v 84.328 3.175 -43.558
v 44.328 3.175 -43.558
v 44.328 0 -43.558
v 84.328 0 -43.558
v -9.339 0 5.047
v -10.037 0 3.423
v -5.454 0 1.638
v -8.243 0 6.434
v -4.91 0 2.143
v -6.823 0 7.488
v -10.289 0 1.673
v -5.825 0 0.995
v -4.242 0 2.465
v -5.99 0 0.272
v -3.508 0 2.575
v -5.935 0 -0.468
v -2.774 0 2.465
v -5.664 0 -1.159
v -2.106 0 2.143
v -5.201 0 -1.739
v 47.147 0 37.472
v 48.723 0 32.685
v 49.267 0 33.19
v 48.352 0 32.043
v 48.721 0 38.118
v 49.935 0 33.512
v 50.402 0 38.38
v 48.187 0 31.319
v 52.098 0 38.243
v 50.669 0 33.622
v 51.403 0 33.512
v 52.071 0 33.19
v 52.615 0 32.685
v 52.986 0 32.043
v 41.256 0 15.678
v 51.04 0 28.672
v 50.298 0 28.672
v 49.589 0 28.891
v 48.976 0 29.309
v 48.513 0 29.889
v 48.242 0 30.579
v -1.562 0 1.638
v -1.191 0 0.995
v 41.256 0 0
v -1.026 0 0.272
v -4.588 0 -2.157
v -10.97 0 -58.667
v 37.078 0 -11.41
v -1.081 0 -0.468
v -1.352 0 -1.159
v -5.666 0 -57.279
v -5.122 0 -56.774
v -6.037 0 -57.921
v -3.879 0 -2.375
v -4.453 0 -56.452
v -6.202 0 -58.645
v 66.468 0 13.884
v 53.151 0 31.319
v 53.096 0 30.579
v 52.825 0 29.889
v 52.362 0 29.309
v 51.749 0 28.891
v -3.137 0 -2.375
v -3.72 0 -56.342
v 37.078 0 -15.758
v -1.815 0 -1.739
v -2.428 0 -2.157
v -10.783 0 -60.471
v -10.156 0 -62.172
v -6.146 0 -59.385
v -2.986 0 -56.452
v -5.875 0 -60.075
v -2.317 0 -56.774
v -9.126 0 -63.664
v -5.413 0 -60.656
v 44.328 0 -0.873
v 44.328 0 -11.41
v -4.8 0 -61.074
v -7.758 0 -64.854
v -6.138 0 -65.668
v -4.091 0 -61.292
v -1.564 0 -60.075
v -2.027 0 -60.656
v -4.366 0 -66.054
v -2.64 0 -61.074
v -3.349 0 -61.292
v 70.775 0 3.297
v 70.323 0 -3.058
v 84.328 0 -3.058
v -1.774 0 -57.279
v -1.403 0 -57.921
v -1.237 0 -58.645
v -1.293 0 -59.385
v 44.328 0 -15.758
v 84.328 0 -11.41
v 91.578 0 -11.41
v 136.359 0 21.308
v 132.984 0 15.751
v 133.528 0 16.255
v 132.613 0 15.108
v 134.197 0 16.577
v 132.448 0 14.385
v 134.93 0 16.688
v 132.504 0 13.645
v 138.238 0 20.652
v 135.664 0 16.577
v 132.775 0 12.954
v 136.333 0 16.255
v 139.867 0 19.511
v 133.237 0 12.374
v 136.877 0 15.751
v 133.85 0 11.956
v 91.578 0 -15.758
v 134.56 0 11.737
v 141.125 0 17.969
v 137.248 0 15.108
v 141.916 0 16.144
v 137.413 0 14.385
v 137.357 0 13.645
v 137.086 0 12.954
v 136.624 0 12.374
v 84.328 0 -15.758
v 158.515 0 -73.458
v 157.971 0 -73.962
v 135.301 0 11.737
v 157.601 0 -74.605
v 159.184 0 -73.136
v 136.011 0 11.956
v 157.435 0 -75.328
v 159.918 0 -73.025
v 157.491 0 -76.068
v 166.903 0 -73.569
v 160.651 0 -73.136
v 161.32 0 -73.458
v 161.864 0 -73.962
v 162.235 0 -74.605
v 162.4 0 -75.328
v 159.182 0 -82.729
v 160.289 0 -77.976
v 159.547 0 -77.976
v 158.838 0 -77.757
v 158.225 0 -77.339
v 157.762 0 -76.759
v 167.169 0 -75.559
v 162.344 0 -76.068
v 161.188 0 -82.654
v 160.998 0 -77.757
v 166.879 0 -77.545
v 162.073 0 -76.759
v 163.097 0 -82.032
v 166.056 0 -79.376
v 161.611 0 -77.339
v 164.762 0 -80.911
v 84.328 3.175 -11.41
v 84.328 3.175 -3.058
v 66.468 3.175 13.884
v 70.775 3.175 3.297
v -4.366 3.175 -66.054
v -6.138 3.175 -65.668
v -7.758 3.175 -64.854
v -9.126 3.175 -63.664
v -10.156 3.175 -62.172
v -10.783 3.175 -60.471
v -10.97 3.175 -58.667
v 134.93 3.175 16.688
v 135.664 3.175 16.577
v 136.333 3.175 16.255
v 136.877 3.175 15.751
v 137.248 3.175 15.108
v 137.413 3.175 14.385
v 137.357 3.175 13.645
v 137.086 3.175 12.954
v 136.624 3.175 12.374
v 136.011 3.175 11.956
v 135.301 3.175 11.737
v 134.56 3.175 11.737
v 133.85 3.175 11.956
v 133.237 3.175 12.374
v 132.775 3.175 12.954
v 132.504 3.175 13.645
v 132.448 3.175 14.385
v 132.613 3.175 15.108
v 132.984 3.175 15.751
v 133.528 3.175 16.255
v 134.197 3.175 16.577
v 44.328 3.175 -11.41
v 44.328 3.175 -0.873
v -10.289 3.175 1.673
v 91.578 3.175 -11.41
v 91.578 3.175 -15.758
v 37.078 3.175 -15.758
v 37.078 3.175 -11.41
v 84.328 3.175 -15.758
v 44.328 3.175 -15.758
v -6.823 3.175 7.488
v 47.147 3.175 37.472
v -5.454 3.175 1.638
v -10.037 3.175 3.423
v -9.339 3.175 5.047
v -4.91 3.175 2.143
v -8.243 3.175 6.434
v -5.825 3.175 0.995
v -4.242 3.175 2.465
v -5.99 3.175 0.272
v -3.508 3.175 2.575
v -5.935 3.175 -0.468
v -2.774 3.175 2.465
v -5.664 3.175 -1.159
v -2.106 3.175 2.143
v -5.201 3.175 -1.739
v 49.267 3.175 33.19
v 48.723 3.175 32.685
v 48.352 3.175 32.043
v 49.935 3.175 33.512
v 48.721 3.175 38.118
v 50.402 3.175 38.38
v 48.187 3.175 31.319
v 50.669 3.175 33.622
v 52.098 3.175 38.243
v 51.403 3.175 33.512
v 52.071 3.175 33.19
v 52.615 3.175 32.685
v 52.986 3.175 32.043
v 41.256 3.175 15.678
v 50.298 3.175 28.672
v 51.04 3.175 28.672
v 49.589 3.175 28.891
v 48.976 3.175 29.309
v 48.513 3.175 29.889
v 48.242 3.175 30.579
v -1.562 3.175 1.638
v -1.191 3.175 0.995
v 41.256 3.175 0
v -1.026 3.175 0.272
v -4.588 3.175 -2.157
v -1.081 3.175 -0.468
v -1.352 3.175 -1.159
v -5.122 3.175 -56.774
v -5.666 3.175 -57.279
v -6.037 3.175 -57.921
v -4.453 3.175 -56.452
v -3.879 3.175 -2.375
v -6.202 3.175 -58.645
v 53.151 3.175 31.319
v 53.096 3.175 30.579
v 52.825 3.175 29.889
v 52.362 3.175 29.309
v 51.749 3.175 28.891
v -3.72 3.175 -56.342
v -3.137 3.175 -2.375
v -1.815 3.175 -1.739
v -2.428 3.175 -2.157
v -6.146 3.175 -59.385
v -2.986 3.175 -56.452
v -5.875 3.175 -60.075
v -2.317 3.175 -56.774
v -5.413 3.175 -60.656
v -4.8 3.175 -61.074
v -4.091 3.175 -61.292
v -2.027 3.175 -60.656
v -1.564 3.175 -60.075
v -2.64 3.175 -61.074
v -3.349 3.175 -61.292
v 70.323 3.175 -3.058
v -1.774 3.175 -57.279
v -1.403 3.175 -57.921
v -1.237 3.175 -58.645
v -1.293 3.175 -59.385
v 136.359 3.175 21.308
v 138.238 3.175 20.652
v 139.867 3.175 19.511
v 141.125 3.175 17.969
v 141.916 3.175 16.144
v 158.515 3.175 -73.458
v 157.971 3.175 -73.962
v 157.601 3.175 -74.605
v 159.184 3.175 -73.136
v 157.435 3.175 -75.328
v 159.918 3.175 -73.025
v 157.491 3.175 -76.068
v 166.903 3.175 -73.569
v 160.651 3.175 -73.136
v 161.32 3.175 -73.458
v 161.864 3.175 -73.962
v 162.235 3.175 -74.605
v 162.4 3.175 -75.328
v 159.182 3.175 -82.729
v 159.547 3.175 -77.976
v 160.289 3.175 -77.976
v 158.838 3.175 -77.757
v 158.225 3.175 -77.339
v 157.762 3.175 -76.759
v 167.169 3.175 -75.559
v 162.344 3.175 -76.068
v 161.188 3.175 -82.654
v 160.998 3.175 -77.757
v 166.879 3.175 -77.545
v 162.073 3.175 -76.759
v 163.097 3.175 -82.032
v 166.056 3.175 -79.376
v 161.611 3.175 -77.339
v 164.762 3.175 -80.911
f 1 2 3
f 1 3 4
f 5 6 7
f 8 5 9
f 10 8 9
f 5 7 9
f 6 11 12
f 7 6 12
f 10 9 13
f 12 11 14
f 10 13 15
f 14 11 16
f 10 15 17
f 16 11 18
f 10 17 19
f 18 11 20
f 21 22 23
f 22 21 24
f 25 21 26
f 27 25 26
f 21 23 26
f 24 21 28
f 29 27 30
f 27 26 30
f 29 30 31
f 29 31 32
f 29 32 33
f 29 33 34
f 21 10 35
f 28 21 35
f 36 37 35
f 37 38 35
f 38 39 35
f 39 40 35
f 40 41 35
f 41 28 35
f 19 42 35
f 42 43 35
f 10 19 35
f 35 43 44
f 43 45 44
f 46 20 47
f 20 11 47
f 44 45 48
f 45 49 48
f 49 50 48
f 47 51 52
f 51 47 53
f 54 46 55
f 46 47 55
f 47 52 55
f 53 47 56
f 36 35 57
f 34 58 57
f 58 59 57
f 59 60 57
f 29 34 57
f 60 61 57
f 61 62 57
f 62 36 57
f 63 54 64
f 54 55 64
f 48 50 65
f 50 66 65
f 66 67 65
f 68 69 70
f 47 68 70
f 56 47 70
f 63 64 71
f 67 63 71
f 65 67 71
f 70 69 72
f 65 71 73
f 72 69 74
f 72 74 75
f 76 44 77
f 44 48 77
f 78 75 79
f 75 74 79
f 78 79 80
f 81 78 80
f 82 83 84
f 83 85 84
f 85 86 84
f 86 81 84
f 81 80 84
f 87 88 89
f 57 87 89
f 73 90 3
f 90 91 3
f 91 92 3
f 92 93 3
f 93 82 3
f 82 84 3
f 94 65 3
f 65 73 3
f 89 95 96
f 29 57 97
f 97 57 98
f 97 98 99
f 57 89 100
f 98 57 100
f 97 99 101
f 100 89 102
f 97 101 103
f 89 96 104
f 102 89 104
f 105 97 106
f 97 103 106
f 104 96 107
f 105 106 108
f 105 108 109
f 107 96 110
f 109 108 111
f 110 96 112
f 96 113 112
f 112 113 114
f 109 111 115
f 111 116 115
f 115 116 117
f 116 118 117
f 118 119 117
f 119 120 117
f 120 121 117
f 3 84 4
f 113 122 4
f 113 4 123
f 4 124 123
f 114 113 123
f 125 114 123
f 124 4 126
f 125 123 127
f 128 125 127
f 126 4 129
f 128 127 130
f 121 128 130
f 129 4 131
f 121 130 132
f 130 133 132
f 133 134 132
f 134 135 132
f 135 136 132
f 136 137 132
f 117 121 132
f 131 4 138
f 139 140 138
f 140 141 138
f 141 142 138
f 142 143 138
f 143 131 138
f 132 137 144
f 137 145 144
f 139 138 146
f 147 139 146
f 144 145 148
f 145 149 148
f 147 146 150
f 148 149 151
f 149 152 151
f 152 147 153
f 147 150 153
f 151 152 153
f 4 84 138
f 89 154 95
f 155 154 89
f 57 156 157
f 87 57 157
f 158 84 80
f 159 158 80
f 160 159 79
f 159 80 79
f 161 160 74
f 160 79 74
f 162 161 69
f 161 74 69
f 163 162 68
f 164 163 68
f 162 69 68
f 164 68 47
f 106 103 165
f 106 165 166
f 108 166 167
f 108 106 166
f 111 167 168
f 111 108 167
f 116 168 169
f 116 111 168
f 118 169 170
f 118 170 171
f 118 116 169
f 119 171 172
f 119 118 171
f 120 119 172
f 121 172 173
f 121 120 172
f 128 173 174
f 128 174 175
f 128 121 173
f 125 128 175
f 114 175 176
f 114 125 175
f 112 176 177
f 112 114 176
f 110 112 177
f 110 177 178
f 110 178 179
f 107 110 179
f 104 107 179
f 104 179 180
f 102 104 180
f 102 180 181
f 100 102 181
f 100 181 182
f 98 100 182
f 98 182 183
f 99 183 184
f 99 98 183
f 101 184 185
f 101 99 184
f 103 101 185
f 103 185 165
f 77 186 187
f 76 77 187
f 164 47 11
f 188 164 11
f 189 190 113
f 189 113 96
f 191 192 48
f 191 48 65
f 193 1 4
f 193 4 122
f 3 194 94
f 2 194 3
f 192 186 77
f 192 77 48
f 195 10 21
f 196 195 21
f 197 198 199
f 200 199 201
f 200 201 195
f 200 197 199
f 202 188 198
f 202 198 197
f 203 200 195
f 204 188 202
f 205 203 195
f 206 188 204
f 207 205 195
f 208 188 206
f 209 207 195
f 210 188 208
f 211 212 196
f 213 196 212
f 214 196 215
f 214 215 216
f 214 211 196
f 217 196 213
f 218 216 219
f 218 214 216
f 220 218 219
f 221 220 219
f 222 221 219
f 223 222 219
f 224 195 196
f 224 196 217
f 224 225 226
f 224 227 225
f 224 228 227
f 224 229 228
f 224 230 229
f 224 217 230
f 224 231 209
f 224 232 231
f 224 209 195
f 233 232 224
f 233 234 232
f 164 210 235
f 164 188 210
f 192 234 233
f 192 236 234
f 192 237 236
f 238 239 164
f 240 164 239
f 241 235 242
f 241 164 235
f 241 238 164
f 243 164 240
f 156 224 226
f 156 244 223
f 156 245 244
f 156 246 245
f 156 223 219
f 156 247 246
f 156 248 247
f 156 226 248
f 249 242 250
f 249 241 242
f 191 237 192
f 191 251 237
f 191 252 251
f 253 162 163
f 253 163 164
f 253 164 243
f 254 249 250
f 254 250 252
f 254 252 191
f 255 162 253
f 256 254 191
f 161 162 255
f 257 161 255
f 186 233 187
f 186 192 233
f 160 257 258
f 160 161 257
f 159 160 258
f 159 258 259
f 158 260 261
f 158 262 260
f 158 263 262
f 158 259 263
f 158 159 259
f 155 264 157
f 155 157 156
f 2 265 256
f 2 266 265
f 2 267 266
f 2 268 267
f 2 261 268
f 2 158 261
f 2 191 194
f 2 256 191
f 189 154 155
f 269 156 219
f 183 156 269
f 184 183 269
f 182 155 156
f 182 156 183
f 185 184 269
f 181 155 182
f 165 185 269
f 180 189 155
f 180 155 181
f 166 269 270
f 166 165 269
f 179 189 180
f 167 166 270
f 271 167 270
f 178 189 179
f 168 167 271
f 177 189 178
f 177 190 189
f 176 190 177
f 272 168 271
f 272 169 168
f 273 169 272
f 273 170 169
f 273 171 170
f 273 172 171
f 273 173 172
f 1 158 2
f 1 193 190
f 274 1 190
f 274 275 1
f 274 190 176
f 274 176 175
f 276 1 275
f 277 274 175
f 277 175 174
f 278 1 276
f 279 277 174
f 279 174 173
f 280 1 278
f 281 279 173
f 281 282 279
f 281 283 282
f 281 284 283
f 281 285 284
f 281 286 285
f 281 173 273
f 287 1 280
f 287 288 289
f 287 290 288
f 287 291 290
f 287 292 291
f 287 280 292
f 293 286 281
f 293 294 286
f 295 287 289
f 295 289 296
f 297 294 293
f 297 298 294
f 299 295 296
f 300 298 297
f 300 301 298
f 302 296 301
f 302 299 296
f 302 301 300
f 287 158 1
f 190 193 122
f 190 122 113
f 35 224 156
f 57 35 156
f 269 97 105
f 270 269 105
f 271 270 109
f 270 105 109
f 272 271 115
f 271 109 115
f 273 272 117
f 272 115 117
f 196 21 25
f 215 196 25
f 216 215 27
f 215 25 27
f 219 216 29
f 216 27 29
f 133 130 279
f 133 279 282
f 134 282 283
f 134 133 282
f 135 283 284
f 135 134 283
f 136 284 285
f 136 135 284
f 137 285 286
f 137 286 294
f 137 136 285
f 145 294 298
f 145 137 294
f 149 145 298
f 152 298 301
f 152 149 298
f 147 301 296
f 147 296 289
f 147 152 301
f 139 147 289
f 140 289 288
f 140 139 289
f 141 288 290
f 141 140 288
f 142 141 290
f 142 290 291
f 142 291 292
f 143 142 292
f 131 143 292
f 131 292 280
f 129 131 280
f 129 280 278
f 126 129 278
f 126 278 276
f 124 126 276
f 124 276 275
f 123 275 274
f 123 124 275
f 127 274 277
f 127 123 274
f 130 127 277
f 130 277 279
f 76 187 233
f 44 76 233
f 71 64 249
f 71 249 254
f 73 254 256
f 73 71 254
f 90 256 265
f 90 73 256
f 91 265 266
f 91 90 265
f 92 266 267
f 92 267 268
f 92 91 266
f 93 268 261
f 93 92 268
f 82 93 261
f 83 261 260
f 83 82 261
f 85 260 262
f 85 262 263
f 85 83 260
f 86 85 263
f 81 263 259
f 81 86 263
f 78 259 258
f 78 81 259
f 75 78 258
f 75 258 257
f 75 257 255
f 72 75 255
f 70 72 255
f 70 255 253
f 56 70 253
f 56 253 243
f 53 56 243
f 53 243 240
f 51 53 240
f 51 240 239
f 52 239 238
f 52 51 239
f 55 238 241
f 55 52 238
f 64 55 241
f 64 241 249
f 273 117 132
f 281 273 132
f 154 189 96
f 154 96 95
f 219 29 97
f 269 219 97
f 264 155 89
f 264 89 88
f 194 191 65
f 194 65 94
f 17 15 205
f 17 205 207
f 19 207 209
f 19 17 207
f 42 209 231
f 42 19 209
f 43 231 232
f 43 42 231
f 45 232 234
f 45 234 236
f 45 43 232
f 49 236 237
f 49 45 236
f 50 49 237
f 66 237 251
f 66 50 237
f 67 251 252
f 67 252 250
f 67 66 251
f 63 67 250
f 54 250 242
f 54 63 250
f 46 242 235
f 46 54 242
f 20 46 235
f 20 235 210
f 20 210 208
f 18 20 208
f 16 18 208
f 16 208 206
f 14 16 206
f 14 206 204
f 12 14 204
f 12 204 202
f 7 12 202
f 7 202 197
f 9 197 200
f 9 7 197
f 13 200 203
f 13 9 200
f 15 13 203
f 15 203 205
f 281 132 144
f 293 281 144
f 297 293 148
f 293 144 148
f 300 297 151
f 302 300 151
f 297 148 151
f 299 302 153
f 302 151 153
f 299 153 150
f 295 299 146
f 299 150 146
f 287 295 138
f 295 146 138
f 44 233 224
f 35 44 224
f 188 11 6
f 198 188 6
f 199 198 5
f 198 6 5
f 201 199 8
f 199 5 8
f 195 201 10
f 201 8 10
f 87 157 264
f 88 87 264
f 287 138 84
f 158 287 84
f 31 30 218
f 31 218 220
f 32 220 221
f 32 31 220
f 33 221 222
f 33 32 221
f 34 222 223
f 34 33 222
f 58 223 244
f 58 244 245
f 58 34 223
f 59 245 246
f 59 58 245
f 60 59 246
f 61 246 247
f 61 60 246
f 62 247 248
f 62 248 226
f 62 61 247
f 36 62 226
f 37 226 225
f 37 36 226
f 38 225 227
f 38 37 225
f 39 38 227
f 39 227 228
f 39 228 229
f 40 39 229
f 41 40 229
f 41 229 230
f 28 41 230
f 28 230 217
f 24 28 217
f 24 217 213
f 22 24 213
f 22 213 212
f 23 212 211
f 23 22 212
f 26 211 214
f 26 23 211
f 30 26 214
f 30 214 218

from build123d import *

# Parameters (mm, degrees)
SKETCH1_R            = 2.4892
BOSS_EXTRUDE1_DEPTH  = 3.175
TRIGGER_CUTOUT_DEPTH = 3.175
SERVO_CUTOUT_DEPTH   = 3.175


with BuildPart() as part:
    # Sketch1 → Boss-Extrude1 (new body)
    with BuildSketch(Plane(origin=(0, 0, 0), x_dir=(1, 0, 0), z_dir=(0, 1, 0))):
        with BuildLine():
            Line((-6.8229868, -7.488197853), (47.14701474, -37.472309865))
            ThreePointArc((47.14701474, -37.472309865), (49.553689318, -38.298669515), (52.097667916, -38.242761734))
            Line((52.097667916, -38.242761734), (136.359344262, -21.308190288))
            ThreePointArc((136.359344262, -21.308190288), (139.866879533, -19.510833837), (141.916296901, -16.144354617))
            Line((141.916296901, -16.144354617), (166.90343399, 73.568749369))
            ThreePointArc((166.90343399, 73.568749369), (165.462253091, 80.188248266), (159.182077212, 82.728751949))
            Line((159.182077212, 82.728751949), (-4.366145722, 66.053653766))
            ThreePointArc((-4.366145722, 66.053653766), (-9.125920254, 63.663982971), (-10.969503308, 58.667265887))
            Line((-10.969503308, 58.667265887), (-10.288924124, -1.672992978))
            ThreePointArc((-10.288924124, -1.672992978), (-9.33910622, -5.047363397), (-6.8229868, -7.488197853))
        make_face()
        with Locations(Location((159.917634832, 75.514453101, 0), (0, 0, 270))):
            Circle(SKETCH1_R, mode=Mode.SUBTRACT)
        with Locations(Location((134.930497743, -14.198650885, 0), (0, 0, 270))):
            Circle(SKETCH1_R, mode=Mode.SUBTRACT)
        with Locations(Location((50.668821397, -31.133222331, 0), (0, 0, 270))):
            Circle(SKETCH1_R, mode=Mode.SUBTRACT)
        with Locations(Location((-3.719648143, 58.830829265, 0), (0, 0, 270))):
            Circle(SKETCH1_R, mode=Mode.SUBTRACT)
        with Locations(Location((-3.508126319, -0.086017173, 0), (0, 0, 270))):
            Circle(SKETCH1_R, mode=Mode.SUBTRACT)
    extrude(amount=BOSS_EXTRUDE1_DEPTH)

    # Sketch3 → trigger cutout (cut)
    with BuildSketch(Plane(origin=(0, 3.175, 0), x_dir=(1, 0, 0), z_dir=(0, 1, 0))):
        Polygon((41.255934536, -15.678441329), (66.468104622, -13.883980824), (70.774809833, -3.296663849), (70.032795293, 7.128640439), (58.56546888, 6.312460623), (53.862019579, 3.583115238), (41.255934536, 0), align=None)
    extrude(amount=-TRIGGER_CUTOUT_DEPTH, mode=Mode.SUBTRACT)

    # Sketch4 → servo cutout (cut)
    with BuildSketch(Plane(origin=(0, 3.175, 0), x_dir=(1, 0, 0), z_dir=(0, 1, 0))):
        Polygon((44.328297275, 43.5580507), (84.328297275, 43.5580507), (84.328297275, 15.7580507), (91.578297275, 15.7580507), (91.578297275, 11.409751948), (84.328297275, 11.409751948), (84.328297275, 3.0580507), (64.328297275, 3.0580507), (64.328297275, -2.168421287), (44.328297275, -2.168421287), (44.328297275, 3.0580507), (44.328297275, 11.409751948), (37.078297275, 11.409751948), (37.078297275, 15.7580507), (44.328297275, 15.7580507), align=None)
    extrude(amount=-SERVO_CUTOUT_DEPTH, mode=Mode.SUBTRACT)


solid = part.part
